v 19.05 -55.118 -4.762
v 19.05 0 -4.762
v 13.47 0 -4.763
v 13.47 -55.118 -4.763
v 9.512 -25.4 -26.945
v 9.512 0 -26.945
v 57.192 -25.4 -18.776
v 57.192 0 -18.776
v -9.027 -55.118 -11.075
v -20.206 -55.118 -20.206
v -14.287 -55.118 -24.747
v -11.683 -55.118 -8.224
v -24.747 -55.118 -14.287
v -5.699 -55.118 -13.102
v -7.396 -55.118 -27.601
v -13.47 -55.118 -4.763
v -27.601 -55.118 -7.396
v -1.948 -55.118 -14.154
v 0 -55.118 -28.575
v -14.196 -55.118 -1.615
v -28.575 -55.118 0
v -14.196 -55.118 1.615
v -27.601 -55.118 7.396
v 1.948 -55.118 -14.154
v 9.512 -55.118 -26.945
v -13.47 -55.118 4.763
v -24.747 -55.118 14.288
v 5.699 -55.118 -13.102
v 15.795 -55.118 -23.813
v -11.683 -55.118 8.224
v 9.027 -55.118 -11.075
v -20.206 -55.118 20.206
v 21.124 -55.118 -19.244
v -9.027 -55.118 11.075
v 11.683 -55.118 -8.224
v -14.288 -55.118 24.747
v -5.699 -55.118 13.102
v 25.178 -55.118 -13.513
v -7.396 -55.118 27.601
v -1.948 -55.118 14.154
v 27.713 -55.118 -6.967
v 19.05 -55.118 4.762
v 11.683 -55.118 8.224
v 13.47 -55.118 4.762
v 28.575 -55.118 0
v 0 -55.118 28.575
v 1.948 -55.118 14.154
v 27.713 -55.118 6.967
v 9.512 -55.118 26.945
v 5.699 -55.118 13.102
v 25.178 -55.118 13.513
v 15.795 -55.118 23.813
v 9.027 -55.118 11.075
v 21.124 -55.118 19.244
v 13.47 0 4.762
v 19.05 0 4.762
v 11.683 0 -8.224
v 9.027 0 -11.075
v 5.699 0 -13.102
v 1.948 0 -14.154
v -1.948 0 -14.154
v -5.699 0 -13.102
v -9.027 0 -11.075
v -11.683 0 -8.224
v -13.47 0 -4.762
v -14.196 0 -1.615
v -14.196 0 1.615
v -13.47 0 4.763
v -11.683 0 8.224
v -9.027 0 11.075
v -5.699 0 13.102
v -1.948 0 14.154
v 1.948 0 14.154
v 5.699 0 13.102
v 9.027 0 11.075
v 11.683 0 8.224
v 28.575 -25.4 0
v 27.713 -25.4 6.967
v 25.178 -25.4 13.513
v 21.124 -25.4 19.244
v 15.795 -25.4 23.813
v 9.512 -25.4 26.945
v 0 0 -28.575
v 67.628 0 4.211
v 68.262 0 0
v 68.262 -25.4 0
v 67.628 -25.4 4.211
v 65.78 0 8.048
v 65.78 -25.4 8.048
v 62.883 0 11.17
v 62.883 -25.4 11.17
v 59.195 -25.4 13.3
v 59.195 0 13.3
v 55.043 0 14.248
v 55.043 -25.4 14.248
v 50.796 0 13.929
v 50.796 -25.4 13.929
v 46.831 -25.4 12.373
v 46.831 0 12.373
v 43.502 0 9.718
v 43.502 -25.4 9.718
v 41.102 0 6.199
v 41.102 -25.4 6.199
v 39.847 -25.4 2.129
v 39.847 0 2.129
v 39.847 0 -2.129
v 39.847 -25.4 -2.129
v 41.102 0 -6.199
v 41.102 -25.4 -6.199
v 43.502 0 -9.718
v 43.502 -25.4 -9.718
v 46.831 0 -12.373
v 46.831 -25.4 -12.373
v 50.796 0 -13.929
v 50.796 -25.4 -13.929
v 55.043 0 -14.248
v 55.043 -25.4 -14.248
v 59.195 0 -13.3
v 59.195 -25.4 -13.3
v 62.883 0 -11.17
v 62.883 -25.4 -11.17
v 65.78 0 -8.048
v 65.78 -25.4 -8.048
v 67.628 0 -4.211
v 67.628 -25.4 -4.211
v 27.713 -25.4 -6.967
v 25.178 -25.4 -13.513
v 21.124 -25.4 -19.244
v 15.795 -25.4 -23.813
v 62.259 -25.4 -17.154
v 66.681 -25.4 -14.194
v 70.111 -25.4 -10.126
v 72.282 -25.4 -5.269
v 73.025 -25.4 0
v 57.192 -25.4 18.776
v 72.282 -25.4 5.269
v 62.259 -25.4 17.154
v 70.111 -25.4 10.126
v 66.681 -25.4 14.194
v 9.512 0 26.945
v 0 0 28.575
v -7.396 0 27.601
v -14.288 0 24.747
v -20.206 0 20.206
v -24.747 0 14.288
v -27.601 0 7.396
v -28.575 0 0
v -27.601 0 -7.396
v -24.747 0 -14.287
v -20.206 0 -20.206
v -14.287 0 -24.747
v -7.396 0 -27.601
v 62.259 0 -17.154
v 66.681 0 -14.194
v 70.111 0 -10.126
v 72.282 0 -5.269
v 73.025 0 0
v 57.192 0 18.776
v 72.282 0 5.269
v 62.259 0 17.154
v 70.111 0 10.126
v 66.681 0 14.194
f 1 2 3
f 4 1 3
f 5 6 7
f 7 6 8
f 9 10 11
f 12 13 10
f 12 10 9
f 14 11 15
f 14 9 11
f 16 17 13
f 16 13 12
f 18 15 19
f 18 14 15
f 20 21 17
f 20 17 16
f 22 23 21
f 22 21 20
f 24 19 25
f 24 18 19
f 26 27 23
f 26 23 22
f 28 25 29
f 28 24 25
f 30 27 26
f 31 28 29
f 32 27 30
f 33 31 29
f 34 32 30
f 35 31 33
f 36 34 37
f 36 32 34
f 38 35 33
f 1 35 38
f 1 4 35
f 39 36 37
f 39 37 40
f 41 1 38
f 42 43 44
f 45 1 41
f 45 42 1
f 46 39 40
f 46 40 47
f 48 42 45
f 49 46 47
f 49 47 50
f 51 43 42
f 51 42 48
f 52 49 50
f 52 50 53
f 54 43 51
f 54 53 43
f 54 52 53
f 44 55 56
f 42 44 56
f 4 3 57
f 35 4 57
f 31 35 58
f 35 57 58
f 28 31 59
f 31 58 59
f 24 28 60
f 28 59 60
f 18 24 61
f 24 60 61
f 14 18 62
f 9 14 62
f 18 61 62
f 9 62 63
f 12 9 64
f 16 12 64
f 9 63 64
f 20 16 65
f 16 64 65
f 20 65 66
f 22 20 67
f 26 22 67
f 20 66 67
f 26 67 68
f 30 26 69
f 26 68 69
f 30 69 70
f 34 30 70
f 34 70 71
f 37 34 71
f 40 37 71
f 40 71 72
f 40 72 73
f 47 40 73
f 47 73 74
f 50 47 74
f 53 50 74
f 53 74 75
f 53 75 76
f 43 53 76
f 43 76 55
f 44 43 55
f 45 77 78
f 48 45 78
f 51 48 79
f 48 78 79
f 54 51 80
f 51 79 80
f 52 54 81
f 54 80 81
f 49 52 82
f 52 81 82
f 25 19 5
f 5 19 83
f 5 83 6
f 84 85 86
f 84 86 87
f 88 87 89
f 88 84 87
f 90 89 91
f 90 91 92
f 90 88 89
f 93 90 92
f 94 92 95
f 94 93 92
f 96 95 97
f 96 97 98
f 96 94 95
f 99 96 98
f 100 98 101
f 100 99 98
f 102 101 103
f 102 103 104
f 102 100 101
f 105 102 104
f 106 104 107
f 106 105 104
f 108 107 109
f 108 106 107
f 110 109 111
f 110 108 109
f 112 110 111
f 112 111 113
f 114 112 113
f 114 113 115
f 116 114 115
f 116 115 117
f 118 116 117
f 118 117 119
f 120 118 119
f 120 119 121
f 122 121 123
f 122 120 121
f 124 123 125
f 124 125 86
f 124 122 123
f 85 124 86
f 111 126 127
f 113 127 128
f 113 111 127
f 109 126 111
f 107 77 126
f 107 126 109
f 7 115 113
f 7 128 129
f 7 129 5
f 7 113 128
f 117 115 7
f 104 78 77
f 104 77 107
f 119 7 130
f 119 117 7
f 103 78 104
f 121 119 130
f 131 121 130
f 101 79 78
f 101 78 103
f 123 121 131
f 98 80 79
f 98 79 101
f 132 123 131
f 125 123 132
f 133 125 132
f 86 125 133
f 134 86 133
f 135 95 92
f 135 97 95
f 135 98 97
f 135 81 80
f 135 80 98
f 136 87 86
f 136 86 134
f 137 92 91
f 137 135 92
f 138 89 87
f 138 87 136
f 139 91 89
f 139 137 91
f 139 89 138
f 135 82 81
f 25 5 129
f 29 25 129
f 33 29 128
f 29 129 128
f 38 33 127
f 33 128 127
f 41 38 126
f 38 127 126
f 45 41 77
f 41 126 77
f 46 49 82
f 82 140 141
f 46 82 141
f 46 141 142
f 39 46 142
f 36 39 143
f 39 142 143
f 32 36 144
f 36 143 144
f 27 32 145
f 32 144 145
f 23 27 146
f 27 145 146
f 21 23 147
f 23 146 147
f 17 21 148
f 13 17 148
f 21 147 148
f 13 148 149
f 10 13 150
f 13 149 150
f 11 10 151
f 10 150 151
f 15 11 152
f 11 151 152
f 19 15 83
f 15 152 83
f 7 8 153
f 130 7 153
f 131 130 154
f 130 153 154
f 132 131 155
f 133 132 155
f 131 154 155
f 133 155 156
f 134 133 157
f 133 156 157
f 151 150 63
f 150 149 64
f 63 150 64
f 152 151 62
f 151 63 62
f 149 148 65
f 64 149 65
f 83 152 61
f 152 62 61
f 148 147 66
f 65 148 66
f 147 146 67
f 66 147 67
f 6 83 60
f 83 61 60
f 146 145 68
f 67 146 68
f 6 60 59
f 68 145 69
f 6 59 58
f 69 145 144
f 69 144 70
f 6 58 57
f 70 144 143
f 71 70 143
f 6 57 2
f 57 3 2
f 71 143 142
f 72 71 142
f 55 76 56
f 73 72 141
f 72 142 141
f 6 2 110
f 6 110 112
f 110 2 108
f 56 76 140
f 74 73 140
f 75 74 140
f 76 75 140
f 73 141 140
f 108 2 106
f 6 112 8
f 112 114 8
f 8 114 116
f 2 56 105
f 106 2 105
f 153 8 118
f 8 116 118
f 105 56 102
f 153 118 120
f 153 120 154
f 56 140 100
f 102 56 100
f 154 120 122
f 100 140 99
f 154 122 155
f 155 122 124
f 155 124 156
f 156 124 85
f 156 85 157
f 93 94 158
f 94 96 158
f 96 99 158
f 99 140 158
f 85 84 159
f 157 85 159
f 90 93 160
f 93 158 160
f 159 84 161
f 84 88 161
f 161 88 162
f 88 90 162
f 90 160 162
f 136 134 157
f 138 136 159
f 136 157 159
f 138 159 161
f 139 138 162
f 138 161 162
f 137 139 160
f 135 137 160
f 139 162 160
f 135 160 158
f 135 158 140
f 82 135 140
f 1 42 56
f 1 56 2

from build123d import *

# Parameters (mm, degrees)
F0_R     = 14.2875
F1_DEPTH = 25.4
F2_DEPTH = 25.4
F3_DEPTH = 55.118


with BuildPart() as f1:
    # F0 (on Front) → F1 (new body)
    with BuildSketch(Plane.XZ):
        with BuildLine():
            Line((9.5121844836, 26.9452959039), (0, 28.575))
            ThreePointArc((0, 28.575), (-28.575, 0), (0, -28.575))
            Line((0, -28.575), (9.5121844836, -26.9452959039))
            ThreePointArc((9.5121844836, -26.9452959039), (23.3274655355, -16.5033322905), (28.575, 0))
            ThreePointArc((28.575, 0), (23.3274655355, 16.5033322905), (9.5121844836, 26.9452959039))
        make_face()
        with BuildLine():
            ThreePointArc((-13.4703841816, 4.7625), (0, 14.2875), (13.4703841816, 4.7625))
            Line((13.4703841816, 4.7625), (19.05, 4.7625))
            Line((19.05, 4.7625), (19.05, -4.7625))
            Line((19.05, -4.7625), (13.4703841816, -4.7625))
            ThreePointArc((13.4703841816, -4.7625), (0, -14.2875), (-13.4703841816, -4.7625))
            Line((-13.4703841816, -4.7625), (-19.05, -4.7625))
            Line((-19.05, -4.7625), (-19.05, 4.7625))
            Line((-19.05, 4.7625), (-13.4703841816, 4.7625))
        make_face(mode=Mode.SUBTRACT)
        with BuildLine():
            Line((57.1919272622, 18.7764181619), (9.5121844836, 26.9452959039))
            ThreePointArc((9.5121844836, 26.9452959039), (23.3274655355, 16.5033322905), (28.575, 0))
            ThreePointArc((28.575, 0), (23.3274655355, -16.5033322905), (9.5121844836, -26.9452959039))
            Line((9.5121844836, -26.9452959039), (57.1919272622, -18.7764181619))
            ThreePointArc((57.1919272622, -18.7764181619), (34.925, 0), (57.1919272622, 18.7764181619))
        make_face()
        with BuildLine():
            ThreePointArc((73.025, 0), (68.5383952831, 12.2804730295), (57.1919272622, 18.7764181619))
            ThreePointArc((57.1919272622, 18.7764181619), (34.925, 0), (57.1919272622, -18.7764181619))
            ThreePointArc((57.1919272622, -18.7764181619), (68.5383952831, -12.2804730295), (73.025, 0))
        make_face()
        with Locations((53.975, 0)):
            Circle(F0_R, mode=Mode.SUBTRACT)
    extrude(amount=F1_DEPTH)

    # F0 (on Front) → F2 (join)
    with BuildSketch(Plane.XZ):
        with BuildLine():
            ThreePointArc((-13.4703841816, -4.7625), (-14.2875, 0), (-13.4703841816, 4.7625))
            Line((-13.4703841816, 4.7625), (-19.05, 4.7625))
            Line((-19.05, 4.7625), (-19.05, -4.7625))
            Line((-19.05, -4.7625), (-13.4703841816, -4.7625))
        make_face()
    extrude(amount=F2_DEPTH)

    # F0 (on Front) → F3 (join)
    with BuildSketch(Plane.XZ):
        with BuildLine():
            Line((9.5121844836, 26.9452959039), (0, 28.575))
            ThreePointArc((0, 28.575), (-28.575, 0), (0, -28.575))
            Line((0, -28.575), (9.5121844836, -26.9452959039))
            ThreePointArc((9.5121844836, -26.9452959039), (23.3274655355, -16.5033322905), (28.575, 0))
            ThreePointArc((28.575, 0), (23.3274655355, 16.5033322905), (9.5121844836, 26.9452959039))
        make_face()
        with BuildLine():
            ThreePointArc((-13.4703841816, 4.7625), (0, 14.2875), (13.4703841816, 4.7625))
            Line((13.4703841816, 4.7625), (19.05, 4.7625))
            Line((19.05, 4.7625), (19.05, -4.7625))
            Line((19.05, -4.7625), (13.4703841816, -4.7625))
            ThreePointArc((13.4703841816, -4.7625), (0, -14.2875), (-13.4703841816, -4.7625))
            Line((-13.4703841816, -4.7625), (-19.05, -4.7625))
            Line((-19.05, -4.7625), (-19.05, 4.7625))
            Line((-19.05, 4.7625), (-13.4703841816, 4.7625))
        make_face(mode=Mode.SUBTRACT)
        with BuildLine():
            ThreePointArc((-13.4703841816, -4.7625), (-14.2875, 0), (-13.4703841816, 4.7625))
            Line((-13.4703841816, 4.7625), (-19.05, 4.7625))
            Line((-19.05, 4.7625), (-19.05, -4.7625))
            Line((-19.05, -4.7625), (-13.4703841816, -4.7625))
        make_face()
    extrude(amount=F3_DEPTH)


solid = f1.part
